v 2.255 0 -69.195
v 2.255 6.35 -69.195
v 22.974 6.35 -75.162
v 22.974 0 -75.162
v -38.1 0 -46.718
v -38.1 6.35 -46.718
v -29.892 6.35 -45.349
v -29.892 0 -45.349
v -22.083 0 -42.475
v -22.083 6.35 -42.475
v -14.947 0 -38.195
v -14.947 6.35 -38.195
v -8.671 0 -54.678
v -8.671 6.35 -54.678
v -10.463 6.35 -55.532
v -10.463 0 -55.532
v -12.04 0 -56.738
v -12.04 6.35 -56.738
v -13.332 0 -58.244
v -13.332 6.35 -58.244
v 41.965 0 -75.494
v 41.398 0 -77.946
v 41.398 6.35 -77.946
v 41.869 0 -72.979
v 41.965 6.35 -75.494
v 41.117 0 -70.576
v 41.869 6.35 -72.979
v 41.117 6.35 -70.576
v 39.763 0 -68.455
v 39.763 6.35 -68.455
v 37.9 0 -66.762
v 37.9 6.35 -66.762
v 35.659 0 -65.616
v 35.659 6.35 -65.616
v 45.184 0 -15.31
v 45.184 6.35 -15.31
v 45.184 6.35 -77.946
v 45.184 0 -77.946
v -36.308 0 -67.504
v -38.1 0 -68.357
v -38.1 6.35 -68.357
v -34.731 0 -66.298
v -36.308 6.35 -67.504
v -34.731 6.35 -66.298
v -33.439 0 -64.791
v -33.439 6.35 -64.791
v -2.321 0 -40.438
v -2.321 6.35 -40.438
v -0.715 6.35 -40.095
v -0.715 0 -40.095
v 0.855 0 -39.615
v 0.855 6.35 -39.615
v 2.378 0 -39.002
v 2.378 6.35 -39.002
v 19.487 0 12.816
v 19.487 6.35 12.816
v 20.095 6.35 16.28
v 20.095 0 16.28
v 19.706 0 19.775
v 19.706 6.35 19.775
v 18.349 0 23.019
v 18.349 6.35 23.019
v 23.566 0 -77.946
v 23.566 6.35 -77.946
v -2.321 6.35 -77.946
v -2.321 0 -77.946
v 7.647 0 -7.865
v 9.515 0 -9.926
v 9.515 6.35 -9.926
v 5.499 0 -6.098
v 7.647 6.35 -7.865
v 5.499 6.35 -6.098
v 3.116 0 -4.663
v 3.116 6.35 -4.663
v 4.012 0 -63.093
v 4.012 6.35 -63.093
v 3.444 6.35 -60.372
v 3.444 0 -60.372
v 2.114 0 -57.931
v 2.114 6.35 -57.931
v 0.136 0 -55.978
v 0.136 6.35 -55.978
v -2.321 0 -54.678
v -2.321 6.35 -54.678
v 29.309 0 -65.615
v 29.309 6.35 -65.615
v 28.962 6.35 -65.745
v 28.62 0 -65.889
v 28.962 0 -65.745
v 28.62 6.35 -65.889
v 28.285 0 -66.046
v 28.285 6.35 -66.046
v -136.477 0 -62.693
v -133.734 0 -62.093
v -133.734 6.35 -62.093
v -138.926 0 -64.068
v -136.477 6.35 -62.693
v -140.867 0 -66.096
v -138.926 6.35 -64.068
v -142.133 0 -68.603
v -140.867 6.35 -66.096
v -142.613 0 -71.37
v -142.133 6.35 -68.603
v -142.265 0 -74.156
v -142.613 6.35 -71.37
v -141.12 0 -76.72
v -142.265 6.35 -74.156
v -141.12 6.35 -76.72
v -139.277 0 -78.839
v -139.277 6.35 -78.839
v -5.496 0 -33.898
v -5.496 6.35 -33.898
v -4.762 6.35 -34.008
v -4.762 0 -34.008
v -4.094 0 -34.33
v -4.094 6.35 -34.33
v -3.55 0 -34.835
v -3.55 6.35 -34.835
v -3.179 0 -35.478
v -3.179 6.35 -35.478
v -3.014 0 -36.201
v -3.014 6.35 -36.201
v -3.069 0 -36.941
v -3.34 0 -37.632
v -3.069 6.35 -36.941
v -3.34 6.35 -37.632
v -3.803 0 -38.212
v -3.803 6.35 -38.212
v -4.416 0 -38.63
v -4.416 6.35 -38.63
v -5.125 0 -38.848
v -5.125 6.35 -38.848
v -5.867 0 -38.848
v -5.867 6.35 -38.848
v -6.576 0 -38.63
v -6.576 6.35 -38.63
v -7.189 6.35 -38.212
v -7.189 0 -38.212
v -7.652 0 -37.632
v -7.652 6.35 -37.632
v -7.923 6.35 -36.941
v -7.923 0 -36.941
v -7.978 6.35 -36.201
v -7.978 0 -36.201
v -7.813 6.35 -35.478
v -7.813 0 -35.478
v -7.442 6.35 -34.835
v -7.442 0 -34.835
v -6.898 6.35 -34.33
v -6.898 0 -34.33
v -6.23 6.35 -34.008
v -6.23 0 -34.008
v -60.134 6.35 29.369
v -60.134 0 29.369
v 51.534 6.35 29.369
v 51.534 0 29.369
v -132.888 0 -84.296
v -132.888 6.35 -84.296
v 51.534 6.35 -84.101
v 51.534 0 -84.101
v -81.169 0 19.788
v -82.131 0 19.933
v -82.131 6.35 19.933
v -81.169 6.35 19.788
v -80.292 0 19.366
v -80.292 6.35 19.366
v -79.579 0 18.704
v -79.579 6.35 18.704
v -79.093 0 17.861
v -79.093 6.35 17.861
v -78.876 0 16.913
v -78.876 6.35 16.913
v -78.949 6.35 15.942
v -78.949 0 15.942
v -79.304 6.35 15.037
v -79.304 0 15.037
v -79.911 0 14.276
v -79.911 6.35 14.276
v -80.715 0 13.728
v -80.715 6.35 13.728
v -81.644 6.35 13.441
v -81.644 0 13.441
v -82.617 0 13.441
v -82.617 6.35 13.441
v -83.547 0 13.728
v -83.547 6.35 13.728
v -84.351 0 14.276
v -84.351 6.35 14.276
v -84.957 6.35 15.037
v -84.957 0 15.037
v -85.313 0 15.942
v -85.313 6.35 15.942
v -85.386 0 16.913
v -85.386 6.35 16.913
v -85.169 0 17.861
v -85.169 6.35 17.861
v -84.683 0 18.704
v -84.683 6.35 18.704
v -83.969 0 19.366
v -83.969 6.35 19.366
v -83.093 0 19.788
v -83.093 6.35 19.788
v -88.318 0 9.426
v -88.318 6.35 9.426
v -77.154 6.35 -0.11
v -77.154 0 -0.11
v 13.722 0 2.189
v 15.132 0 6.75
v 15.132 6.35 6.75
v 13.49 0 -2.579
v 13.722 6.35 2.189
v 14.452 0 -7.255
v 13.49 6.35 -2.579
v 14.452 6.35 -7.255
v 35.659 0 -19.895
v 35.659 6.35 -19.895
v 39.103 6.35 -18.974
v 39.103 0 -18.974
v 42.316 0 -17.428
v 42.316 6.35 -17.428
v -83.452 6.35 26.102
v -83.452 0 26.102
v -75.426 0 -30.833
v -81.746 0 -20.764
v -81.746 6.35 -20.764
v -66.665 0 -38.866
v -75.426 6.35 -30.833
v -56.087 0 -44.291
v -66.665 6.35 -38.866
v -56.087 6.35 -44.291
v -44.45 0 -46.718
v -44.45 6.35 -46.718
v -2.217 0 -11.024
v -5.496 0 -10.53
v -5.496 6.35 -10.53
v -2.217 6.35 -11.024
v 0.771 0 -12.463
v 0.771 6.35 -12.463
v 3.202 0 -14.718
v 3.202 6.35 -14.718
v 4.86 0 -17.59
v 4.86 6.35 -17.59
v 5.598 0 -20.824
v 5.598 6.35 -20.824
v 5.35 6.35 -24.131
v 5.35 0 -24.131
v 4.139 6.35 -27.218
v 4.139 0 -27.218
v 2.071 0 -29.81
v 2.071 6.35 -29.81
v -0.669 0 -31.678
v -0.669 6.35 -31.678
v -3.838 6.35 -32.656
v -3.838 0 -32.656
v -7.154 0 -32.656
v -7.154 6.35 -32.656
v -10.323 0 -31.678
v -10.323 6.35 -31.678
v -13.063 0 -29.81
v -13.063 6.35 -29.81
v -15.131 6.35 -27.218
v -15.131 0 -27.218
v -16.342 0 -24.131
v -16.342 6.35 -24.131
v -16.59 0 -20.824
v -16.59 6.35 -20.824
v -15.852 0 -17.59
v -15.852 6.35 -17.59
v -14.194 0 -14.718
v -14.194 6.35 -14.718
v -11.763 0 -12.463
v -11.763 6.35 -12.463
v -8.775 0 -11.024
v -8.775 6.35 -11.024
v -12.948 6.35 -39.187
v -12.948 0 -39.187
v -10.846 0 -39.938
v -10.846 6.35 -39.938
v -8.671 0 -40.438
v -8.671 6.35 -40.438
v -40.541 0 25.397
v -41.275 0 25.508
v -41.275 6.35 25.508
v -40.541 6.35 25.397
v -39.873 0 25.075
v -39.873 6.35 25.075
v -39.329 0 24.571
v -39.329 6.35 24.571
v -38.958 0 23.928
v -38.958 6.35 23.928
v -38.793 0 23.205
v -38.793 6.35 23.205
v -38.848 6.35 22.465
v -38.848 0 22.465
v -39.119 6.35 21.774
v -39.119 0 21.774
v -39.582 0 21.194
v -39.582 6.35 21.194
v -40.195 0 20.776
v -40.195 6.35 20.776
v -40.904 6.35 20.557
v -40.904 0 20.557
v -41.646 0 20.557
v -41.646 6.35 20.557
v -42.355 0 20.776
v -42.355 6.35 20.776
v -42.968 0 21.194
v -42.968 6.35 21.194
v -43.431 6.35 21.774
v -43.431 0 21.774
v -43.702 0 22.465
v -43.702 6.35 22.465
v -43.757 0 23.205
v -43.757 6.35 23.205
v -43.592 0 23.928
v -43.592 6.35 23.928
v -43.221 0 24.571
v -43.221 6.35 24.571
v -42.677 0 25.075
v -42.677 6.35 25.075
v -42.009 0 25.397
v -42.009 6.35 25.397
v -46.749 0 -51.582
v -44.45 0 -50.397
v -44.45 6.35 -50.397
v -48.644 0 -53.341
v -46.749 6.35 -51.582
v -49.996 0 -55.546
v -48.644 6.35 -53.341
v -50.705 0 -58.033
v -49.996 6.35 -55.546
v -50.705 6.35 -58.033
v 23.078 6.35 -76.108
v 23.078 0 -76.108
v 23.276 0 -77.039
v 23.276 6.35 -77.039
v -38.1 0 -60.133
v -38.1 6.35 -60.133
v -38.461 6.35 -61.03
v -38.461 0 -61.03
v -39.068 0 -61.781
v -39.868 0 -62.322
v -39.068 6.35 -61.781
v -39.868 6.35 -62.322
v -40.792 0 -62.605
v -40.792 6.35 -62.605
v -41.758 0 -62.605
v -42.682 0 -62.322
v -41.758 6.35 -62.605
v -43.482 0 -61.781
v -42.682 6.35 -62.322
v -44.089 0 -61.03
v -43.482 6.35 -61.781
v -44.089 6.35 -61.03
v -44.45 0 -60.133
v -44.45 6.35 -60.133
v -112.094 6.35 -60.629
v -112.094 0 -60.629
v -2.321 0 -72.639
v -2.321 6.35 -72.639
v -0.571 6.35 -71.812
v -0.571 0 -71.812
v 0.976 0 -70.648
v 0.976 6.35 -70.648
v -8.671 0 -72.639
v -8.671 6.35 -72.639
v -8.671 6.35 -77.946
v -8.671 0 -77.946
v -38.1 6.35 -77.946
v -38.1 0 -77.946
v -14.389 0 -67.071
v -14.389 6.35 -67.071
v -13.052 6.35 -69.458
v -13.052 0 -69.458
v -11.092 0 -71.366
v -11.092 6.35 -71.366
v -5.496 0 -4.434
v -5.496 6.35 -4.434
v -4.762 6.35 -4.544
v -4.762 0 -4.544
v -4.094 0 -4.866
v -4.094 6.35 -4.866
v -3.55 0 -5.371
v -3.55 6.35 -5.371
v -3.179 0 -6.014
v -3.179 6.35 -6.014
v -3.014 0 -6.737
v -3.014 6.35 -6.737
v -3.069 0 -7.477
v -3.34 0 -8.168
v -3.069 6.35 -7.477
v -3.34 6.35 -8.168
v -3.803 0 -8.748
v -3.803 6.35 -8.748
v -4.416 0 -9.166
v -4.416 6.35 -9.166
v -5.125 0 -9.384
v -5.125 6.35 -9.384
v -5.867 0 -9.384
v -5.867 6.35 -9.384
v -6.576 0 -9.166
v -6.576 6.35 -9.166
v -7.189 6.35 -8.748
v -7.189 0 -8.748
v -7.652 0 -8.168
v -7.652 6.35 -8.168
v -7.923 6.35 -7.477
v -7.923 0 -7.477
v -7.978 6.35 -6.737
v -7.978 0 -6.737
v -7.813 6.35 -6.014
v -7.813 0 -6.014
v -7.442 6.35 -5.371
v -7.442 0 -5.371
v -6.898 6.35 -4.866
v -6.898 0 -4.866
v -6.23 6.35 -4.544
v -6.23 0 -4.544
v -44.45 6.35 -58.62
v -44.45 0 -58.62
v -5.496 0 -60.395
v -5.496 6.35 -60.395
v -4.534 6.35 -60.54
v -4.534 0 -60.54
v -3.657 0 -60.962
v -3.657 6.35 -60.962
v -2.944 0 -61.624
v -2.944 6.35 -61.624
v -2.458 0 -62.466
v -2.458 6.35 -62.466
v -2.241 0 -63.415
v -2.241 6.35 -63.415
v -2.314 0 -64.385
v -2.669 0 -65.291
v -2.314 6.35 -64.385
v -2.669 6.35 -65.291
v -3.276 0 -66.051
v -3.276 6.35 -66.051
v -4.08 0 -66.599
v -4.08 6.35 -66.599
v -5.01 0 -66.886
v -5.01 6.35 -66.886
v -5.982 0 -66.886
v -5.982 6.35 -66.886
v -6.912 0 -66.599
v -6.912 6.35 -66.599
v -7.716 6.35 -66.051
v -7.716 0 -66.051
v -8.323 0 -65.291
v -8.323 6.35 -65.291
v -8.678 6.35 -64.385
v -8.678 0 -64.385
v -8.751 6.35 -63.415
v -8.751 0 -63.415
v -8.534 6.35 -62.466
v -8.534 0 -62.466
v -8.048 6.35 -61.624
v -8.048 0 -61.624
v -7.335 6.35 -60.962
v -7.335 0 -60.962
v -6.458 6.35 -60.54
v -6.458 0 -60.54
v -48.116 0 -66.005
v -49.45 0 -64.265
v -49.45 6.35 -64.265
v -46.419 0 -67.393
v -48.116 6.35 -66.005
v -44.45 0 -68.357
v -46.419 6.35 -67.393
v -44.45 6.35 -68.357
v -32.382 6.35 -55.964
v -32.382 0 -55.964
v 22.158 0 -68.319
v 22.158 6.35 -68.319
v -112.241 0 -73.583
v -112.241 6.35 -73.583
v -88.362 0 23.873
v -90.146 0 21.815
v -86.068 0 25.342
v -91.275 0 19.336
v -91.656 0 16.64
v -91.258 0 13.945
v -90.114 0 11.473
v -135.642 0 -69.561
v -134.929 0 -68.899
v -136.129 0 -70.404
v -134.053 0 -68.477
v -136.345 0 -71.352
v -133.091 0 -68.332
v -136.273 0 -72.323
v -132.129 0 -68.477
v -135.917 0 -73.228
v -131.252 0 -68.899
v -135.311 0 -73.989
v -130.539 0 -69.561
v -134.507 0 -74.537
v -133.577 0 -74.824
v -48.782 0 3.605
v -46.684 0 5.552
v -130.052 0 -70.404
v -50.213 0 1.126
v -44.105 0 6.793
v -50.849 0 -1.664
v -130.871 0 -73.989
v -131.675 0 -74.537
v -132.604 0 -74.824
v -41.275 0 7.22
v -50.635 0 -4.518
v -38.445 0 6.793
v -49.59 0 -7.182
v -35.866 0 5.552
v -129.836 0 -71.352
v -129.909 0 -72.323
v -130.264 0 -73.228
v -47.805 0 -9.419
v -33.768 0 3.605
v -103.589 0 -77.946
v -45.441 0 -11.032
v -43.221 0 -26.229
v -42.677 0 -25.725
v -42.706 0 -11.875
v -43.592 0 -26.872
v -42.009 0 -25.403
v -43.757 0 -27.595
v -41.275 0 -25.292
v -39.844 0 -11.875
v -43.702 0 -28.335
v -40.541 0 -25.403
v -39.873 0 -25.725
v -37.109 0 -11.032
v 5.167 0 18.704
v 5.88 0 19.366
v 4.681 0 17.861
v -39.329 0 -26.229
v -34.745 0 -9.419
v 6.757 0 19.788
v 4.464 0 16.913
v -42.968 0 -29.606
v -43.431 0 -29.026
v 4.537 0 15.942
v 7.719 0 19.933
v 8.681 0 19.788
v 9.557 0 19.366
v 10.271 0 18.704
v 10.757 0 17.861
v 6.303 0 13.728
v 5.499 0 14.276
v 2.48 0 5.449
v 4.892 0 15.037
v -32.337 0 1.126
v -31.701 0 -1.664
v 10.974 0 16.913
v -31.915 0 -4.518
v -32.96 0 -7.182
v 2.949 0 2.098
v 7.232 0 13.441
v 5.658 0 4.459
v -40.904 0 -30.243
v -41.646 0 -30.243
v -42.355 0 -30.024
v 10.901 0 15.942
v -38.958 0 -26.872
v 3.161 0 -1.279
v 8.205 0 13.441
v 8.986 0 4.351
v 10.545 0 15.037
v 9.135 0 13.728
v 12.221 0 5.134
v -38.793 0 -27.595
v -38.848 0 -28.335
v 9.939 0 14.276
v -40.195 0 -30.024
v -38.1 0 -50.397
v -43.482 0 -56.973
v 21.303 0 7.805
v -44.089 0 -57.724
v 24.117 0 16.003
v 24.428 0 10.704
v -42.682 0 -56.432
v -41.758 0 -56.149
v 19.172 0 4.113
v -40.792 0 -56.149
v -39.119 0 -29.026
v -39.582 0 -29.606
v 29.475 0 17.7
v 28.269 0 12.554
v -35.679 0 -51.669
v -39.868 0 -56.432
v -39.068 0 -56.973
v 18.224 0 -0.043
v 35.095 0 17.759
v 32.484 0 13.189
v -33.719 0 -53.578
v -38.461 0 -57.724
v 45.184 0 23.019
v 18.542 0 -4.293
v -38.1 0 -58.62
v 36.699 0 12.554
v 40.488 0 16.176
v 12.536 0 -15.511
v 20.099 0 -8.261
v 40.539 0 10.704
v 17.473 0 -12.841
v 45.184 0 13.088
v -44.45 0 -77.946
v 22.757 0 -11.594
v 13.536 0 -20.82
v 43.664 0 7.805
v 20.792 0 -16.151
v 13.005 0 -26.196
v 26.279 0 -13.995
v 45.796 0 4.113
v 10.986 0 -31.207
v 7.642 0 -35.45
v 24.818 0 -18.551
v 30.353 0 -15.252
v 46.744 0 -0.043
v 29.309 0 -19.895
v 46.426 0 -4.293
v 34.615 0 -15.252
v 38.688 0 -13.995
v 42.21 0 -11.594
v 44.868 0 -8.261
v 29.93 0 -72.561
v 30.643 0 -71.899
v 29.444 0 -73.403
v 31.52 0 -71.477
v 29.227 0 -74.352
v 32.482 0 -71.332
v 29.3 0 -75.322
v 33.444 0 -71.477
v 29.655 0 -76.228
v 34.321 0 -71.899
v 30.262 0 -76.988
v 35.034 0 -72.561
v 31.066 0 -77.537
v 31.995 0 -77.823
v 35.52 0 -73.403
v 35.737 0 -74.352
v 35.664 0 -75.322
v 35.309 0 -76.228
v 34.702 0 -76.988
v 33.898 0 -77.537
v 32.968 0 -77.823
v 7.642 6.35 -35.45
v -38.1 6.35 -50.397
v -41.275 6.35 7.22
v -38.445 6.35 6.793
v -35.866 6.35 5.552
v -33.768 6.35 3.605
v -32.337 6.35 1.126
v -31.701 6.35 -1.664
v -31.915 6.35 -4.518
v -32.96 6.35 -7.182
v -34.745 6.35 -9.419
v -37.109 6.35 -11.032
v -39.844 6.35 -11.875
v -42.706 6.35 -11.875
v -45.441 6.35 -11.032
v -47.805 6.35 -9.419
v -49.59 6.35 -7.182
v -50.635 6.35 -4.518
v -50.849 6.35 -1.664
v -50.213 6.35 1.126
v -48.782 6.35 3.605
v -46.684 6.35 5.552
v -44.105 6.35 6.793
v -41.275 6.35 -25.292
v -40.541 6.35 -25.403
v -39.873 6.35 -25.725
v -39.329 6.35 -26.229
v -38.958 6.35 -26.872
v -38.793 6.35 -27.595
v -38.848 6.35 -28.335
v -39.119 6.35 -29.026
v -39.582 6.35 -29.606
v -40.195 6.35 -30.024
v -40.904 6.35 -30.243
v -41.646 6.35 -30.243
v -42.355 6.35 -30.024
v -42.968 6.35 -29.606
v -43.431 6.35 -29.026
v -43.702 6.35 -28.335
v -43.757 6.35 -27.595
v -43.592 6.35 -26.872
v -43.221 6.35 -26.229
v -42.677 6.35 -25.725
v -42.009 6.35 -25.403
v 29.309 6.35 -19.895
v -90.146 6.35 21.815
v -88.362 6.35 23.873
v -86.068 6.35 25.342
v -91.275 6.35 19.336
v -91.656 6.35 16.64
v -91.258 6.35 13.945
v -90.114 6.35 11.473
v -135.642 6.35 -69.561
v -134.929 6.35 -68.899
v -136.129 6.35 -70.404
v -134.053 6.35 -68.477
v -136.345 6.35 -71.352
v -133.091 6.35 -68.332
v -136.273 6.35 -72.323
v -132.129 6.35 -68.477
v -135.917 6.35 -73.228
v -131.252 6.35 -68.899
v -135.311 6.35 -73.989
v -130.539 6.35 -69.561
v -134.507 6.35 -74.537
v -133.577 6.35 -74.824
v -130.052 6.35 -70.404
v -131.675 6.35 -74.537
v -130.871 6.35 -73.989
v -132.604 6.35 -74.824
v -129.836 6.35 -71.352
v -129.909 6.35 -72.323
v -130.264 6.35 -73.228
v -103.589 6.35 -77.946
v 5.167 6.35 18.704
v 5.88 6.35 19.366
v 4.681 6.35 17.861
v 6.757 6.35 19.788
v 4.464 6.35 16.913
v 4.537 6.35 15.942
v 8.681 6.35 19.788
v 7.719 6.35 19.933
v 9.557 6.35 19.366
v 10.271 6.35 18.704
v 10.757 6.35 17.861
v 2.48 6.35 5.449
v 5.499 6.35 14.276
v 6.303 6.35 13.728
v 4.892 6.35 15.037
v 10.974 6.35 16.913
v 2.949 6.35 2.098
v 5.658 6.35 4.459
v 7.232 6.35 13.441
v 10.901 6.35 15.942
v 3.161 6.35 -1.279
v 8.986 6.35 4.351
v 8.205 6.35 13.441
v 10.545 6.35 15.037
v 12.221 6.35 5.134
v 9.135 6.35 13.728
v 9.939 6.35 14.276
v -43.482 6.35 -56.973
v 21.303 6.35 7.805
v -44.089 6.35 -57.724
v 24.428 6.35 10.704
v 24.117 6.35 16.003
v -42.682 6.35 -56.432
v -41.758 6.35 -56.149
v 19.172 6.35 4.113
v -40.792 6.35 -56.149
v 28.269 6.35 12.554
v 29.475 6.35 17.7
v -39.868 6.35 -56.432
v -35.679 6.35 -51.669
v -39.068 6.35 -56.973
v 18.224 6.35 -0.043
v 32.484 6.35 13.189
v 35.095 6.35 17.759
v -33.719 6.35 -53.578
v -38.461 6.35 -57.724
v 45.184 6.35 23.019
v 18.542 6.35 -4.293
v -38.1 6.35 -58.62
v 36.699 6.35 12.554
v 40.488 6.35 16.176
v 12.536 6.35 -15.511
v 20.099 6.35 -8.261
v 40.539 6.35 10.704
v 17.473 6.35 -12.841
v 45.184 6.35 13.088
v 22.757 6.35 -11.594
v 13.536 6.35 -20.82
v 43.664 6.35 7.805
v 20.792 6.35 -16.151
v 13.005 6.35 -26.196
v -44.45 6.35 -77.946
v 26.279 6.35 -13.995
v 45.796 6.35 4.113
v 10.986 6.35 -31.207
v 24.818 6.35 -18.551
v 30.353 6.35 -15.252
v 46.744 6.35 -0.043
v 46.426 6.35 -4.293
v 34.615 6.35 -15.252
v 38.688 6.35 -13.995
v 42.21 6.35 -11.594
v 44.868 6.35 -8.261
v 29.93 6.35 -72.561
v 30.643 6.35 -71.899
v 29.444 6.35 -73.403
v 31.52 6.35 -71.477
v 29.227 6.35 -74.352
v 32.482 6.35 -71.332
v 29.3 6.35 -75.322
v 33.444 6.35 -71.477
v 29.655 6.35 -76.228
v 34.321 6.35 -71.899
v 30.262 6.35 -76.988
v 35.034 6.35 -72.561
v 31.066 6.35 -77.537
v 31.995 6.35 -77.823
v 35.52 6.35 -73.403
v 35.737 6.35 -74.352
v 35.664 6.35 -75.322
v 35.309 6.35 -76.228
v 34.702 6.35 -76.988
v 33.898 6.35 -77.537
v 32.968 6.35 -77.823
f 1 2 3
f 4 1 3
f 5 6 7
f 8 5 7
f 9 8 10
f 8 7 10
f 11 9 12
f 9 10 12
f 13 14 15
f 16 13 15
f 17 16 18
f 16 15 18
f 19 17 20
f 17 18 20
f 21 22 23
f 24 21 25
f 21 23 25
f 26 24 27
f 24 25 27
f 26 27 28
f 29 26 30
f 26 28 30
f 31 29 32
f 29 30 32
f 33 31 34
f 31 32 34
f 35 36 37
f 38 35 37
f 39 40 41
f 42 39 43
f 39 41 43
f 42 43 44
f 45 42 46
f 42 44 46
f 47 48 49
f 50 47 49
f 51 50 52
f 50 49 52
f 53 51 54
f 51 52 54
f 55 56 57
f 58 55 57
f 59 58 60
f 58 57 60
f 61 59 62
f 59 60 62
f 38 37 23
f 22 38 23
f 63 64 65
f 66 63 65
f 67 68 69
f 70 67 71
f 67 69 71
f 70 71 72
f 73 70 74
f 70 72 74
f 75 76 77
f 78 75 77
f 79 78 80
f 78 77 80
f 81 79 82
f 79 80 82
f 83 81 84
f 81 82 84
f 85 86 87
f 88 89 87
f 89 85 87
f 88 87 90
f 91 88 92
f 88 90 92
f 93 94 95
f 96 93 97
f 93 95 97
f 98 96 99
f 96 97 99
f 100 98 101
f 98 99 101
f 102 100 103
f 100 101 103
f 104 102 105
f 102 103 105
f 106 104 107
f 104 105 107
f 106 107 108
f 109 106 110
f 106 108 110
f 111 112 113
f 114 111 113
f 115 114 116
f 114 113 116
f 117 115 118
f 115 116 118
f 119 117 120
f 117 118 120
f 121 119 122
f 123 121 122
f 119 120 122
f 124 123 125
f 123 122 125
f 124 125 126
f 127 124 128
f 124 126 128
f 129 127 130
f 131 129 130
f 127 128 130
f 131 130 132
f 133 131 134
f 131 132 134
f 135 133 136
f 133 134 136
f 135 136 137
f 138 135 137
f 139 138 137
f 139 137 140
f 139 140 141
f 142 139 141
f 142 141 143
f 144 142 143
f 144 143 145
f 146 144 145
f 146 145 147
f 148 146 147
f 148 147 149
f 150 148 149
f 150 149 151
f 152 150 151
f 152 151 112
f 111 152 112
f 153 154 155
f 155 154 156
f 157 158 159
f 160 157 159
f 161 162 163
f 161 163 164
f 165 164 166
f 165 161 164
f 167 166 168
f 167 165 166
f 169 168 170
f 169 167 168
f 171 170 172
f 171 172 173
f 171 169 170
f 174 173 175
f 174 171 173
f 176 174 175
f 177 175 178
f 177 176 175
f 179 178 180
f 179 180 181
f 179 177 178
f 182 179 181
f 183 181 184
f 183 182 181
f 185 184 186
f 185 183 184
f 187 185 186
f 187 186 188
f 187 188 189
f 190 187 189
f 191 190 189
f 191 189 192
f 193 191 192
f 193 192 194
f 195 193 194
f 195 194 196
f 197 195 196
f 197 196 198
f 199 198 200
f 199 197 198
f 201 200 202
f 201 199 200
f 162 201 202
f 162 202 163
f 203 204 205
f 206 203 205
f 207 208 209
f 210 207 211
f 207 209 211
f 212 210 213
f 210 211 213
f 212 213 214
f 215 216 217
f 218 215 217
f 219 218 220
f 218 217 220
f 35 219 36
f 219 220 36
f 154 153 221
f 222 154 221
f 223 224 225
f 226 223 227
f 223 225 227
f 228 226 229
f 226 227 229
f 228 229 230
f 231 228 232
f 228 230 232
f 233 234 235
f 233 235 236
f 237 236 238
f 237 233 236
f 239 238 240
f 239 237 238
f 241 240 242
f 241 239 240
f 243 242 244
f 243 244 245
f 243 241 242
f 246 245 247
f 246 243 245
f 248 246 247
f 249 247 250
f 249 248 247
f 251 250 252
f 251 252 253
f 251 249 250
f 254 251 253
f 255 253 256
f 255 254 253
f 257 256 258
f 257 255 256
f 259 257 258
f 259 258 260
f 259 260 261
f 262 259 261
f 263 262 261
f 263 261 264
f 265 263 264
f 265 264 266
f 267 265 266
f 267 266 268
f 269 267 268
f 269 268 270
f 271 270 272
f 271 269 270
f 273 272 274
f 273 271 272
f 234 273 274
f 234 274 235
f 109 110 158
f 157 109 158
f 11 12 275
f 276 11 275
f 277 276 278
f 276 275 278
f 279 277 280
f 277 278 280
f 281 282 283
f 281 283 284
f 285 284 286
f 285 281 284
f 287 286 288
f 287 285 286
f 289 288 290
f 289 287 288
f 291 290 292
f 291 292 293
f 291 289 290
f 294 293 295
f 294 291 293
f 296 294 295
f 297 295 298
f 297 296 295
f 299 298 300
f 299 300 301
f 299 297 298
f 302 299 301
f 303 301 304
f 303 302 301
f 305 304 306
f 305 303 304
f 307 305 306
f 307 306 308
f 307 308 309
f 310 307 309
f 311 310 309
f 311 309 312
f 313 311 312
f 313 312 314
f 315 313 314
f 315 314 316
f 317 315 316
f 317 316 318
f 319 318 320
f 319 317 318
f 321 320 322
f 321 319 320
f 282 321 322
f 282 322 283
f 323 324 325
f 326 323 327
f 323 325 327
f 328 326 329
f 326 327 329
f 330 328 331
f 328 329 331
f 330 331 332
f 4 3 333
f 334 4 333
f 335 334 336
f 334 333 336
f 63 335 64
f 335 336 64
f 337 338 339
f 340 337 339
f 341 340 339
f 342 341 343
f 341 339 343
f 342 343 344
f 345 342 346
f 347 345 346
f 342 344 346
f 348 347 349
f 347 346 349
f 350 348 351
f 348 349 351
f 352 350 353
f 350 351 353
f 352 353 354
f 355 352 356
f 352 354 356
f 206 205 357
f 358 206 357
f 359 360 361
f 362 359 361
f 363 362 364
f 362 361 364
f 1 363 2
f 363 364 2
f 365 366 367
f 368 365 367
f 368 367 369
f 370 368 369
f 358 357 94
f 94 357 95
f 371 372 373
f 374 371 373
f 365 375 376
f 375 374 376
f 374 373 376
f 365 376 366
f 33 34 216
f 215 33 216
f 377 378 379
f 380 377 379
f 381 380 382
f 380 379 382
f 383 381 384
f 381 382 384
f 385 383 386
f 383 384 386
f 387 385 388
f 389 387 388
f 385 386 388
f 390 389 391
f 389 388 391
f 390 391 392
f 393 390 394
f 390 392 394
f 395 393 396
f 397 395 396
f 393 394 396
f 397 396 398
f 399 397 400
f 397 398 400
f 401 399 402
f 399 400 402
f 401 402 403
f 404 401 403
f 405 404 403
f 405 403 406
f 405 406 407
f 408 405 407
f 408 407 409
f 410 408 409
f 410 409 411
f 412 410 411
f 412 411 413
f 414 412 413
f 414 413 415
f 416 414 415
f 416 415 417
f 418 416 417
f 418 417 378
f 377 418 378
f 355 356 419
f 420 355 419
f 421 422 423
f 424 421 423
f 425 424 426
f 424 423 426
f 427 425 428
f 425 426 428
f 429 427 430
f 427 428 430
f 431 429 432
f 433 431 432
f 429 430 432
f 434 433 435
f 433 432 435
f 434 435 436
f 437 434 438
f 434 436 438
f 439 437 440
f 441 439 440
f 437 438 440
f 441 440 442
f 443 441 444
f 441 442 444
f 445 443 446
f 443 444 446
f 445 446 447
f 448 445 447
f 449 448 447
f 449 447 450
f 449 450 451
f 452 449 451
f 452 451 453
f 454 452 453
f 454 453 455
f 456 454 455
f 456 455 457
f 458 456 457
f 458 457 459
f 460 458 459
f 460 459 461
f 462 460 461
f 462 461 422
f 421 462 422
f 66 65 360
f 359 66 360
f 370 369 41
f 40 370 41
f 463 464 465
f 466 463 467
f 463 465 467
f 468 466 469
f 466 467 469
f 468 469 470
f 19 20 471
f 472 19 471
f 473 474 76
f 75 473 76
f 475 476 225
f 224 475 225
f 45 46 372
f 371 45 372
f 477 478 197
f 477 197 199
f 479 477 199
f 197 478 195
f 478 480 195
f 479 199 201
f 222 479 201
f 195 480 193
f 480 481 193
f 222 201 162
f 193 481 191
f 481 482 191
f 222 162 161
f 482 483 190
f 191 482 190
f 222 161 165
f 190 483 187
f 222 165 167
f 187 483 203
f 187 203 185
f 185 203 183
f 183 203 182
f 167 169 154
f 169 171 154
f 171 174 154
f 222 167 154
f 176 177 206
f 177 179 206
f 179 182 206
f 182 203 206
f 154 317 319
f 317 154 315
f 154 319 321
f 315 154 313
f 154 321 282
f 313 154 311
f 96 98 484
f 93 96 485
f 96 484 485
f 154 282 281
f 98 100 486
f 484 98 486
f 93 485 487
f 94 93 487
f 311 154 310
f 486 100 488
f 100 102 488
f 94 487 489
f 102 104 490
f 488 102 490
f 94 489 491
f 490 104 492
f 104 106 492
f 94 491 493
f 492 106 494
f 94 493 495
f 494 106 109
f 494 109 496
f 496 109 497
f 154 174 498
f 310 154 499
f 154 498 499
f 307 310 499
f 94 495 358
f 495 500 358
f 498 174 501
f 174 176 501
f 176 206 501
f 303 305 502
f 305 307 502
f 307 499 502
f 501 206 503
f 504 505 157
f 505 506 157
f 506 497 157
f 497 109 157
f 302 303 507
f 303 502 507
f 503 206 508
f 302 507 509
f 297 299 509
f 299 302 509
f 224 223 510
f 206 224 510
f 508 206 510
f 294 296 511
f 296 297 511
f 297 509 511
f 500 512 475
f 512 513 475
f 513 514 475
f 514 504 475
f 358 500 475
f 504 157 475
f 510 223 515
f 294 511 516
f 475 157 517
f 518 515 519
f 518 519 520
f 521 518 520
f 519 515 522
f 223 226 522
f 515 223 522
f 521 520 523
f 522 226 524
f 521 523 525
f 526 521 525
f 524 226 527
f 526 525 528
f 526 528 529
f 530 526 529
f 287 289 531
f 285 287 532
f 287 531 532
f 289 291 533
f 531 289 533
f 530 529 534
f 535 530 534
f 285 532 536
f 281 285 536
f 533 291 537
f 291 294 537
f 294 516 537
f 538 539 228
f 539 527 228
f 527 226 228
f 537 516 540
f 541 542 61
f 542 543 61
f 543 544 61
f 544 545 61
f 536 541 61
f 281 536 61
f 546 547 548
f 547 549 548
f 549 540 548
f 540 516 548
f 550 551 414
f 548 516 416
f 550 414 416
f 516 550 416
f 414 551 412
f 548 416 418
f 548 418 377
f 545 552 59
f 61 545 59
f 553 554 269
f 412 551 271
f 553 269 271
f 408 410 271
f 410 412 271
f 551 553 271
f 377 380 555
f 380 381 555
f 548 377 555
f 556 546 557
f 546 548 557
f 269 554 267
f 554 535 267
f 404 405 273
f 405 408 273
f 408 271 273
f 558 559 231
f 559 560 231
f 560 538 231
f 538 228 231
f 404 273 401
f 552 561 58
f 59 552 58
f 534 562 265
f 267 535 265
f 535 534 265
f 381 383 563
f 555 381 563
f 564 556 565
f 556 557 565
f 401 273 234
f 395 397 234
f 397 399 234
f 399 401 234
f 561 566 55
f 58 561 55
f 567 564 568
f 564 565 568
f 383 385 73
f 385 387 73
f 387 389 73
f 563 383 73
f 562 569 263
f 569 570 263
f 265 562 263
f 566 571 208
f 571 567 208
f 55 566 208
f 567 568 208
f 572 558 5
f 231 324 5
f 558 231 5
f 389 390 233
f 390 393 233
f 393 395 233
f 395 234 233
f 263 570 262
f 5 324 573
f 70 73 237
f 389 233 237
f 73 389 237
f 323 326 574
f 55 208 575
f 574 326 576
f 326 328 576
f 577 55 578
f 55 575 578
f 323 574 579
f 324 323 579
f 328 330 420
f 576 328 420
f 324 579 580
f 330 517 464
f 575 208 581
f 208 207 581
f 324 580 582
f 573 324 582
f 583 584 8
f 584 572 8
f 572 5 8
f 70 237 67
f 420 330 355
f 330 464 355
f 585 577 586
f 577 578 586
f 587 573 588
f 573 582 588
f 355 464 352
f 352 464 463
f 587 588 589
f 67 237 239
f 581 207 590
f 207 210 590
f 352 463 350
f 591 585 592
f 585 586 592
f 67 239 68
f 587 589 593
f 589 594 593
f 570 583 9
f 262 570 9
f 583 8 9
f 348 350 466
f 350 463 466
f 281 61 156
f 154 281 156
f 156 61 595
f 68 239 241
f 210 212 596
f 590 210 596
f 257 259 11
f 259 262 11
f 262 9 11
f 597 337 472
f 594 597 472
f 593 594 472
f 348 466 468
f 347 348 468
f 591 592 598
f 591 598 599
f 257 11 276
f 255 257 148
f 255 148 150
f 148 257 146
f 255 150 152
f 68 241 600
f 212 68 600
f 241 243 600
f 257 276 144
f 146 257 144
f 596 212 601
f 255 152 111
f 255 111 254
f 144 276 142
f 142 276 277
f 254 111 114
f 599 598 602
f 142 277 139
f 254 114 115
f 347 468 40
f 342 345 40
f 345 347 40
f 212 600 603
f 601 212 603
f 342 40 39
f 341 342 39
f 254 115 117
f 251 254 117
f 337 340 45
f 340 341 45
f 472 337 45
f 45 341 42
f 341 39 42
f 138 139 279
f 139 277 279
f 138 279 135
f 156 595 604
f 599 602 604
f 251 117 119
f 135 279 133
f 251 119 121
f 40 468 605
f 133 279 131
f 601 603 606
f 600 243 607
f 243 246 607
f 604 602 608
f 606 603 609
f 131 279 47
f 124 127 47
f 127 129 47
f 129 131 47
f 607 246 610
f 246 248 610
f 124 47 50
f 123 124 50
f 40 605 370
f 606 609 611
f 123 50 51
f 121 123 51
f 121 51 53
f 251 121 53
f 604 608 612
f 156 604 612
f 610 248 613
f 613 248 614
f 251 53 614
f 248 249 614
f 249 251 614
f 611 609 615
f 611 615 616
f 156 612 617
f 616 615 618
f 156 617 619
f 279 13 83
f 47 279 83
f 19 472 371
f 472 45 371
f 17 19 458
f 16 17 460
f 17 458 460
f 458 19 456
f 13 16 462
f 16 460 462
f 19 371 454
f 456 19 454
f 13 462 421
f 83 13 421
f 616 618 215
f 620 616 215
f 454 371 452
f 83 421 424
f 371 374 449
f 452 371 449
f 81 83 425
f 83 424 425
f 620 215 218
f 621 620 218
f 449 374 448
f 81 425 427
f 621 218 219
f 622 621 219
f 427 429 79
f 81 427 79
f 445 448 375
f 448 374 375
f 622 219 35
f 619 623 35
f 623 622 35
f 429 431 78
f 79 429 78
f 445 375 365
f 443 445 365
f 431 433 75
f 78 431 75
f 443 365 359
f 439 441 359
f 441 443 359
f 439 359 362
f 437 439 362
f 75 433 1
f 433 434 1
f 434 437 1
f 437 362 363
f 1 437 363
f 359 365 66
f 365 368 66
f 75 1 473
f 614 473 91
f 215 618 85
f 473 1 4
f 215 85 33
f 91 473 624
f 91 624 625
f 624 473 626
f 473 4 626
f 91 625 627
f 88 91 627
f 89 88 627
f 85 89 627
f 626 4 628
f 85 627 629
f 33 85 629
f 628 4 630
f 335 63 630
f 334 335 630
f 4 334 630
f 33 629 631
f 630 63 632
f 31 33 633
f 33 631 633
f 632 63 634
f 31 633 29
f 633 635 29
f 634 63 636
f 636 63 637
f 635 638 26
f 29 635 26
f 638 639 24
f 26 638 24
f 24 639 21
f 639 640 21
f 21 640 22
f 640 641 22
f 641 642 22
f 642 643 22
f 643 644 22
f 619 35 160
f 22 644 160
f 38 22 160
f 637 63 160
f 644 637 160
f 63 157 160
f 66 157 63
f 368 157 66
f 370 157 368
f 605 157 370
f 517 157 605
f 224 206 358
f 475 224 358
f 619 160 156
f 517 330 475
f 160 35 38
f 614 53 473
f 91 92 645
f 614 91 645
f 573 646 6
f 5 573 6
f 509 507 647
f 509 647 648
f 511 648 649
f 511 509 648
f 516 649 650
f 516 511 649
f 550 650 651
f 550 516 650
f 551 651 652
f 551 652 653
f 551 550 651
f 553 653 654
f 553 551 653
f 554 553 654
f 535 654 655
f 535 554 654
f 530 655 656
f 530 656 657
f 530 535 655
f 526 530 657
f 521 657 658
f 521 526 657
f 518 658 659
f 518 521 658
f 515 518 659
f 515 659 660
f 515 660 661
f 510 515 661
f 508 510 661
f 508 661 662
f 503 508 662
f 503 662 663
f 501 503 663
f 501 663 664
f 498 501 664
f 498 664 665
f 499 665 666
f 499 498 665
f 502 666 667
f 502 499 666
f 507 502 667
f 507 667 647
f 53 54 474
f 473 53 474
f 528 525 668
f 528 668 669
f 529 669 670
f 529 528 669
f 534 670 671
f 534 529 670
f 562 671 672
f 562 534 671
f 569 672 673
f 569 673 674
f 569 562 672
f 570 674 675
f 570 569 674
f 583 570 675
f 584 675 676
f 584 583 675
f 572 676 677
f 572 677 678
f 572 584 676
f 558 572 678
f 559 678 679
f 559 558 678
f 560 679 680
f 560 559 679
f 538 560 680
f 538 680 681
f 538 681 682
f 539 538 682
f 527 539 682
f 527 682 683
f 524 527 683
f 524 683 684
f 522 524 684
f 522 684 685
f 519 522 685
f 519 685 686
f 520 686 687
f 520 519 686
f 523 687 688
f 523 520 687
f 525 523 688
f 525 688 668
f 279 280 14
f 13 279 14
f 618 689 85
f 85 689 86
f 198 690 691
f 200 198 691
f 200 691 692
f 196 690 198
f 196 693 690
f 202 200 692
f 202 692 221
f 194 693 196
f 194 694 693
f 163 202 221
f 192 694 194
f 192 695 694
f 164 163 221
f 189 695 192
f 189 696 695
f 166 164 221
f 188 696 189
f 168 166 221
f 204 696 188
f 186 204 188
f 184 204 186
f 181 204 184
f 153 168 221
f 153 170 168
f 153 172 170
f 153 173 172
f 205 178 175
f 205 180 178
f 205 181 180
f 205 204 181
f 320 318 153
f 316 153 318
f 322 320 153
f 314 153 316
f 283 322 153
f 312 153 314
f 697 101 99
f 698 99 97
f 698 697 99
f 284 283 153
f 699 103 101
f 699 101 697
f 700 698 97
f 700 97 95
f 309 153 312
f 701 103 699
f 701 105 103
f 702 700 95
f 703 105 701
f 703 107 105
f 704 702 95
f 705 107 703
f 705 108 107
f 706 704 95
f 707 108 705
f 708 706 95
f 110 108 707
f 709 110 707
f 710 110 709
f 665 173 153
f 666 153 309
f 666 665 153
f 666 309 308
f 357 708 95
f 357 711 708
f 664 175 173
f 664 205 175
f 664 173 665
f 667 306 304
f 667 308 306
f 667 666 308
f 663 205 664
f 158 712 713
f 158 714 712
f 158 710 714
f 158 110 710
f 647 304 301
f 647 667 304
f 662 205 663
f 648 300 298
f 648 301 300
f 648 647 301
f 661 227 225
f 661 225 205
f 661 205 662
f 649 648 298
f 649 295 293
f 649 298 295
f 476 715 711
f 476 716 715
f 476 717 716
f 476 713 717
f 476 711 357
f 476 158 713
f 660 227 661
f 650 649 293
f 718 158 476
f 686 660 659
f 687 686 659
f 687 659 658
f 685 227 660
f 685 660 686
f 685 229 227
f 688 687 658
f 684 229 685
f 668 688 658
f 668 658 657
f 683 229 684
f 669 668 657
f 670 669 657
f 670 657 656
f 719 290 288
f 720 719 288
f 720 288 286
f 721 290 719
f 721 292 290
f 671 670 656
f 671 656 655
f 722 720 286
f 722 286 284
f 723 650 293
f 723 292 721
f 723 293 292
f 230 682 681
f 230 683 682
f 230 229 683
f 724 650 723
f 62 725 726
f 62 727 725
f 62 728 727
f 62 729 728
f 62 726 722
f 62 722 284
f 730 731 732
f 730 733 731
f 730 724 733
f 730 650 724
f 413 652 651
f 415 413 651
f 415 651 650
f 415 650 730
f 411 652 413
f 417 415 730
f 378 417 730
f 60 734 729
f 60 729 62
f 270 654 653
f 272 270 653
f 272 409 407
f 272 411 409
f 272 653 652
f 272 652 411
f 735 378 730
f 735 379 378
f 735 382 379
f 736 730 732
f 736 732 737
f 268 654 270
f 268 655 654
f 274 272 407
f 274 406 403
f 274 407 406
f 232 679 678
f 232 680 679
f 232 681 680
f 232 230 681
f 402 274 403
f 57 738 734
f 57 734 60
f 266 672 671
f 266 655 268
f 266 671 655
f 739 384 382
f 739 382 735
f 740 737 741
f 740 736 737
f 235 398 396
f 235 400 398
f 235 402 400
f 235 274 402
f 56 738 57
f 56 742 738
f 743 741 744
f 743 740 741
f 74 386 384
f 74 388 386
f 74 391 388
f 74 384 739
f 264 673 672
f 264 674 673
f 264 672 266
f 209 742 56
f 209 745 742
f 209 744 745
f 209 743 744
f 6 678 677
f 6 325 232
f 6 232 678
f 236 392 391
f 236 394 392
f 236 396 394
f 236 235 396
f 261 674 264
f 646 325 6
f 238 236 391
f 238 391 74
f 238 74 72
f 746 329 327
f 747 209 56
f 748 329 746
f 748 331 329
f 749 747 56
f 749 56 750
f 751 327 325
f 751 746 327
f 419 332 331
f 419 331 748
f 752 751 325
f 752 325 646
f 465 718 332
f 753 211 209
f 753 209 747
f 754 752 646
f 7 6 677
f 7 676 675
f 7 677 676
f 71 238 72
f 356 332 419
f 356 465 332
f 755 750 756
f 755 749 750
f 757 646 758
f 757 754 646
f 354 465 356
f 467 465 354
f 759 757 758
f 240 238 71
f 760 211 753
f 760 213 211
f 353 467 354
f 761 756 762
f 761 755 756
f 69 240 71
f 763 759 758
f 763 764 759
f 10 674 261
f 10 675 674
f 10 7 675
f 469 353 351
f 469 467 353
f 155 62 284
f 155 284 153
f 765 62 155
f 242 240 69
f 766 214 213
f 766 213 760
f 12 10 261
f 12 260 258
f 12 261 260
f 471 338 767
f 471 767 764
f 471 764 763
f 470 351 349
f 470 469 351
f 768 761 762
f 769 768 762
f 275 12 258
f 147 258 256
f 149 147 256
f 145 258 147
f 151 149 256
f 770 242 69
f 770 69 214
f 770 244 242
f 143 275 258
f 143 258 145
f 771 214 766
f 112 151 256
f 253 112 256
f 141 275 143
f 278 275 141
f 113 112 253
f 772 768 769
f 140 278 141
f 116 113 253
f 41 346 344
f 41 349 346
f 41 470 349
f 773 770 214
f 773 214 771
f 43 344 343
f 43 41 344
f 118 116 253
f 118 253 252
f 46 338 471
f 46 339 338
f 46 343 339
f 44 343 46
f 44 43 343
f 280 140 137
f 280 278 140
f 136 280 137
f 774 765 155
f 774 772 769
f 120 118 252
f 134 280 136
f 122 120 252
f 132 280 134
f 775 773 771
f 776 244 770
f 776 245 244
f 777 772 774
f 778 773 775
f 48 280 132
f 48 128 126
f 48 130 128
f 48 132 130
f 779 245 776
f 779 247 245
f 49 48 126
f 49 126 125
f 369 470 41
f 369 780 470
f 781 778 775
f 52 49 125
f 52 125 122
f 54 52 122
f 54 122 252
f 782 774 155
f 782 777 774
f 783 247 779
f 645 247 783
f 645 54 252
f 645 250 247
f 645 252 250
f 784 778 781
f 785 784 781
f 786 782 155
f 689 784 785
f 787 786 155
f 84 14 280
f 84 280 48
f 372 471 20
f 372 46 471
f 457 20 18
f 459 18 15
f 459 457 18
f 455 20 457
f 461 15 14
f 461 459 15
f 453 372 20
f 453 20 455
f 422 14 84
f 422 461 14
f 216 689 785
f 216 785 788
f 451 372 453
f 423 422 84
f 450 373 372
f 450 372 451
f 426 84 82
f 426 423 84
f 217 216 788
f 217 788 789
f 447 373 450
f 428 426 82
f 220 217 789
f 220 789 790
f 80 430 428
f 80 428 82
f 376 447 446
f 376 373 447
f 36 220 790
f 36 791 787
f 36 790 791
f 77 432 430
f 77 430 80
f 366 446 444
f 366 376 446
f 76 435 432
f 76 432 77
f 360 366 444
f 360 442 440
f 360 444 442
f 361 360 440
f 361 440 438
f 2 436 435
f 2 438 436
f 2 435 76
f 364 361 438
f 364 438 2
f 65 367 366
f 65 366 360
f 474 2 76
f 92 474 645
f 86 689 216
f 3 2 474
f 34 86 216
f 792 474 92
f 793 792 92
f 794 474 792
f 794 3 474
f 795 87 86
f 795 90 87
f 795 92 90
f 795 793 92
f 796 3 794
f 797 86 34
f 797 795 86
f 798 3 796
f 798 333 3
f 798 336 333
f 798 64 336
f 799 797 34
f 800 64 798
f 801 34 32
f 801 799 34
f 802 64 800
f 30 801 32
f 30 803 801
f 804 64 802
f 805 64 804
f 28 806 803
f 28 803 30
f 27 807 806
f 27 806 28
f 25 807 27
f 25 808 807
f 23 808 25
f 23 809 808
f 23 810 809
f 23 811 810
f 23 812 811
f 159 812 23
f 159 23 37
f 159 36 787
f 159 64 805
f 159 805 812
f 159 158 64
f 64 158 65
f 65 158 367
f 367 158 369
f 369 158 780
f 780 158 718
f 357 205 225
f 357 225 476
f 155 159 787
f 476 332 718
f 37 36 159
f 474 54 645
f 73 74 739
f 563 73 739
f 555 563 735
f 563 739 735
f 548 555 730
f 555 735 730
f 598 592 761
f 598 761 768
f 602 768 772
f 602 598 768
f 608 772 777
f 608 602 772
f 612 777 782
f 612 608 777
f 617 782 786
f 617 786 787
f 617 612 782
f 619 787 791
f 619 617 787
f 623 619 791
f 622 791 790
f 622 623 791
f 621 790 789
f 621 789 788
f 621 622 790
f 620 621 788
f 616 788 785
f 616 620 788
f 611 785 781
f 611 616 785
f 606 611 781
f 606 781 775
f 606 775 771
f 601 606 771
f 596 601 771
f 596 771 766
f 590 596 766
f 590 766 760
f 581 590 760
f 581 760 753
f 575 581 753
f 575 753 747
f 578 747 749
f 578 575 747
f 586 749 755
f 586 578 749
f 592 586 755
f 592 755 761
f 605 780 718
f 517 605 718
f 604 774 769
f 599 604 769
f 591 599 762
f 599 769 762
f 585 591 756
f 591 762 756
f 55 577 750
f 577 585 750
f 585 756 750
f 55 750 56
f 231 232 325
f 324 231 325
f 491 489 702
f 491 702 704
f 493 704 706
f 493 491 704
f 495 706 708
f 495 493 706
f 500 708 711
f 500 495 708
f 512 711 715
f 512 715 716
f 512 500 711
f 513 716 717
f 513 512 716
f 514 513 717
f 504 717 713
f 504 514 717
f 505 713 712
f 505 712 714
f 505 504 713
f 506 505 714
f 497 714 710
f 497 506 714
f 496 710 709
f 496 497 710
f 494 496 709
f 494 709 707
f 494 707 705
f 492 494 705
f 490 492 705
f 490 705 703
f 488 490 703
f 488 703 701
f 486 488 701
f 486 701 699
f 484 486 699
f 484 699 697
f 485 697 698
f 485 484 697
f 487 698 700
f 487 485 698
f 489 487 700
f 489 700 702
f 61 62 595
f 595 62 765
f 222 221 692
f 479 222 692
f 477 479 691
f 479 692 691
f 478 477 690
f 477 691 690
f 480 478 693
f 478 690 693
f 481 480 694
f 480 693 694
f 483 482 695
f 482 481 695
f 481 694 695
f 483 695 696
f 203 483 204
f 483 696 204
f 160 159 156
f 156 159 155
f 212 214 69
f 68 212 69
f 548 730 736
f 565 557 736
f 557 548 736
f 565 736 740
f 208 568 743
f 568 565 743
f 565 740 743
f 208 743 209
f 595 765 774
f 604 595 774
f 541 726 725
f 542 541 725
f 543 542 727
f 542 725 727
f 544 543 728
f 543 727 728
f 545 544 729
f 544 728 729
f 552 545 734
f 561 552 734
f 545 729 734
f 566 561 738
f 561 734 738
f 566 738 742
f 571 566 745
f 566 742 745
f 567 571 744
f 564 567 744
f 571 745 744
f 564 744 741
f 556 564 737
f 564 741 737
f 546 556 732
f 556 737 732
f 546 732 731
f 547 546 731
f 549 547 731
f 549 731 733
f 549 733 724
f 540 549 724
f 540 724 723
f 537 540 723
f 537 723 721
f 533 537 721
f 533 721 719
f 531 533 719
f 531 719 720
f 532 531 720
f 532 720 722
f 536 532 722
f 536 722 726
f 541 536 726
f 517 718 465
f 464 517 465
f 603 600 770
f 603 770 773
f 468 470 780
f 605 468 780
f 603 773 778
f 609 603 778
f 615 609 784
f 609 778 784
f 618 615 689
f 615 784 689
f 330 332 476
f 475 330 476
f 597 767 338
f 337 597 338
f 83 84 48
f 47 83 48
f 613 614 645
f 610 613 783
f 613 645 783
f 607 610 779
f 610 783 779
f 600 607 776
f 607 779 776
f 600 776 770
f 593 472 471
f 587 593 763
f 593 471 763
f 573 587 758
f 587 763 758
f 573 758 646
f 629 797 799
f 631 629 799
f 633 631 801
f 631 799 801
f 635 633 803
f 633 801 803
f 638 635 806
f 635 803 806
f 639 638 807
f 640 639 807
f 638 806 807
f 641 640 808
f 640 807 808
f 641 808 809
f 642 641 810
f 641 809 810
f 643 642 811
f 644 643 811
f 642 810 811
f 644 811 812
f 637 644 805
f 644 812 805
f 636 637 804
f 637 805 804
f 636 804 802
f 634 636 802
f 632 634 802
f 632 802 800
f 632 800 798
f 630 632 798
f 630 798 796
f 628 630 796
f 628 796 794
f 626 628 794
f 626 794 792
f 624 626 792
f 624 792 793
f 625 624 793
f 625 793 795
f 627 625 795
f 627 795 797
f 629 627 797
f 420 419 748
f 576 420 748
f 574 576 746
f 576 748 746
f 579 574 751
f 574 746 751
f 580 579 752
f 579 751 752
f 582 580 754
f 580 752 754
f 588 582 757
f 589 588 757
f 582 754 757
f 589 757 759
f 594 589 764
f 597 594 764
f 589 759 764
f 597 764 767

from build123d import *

# Parameters (mm, degrees)
SKETCH2_R           = 9.6012
SKETCH2_R_2         = 2.4892
SKETCH2_R_3         = 3.2639
SKETCH2_R_4         = 11.1252
SKETCH2_R_5         = 14.3002
SKETCH2_R_6         = 2.413
BOSS_EXTRUDE1_DEPTH = 6.35
SKETCH3_R           = 3.2639
SKETCH3_R_2         = 2.413
SKETCH3_R_3         = 2.4892
CUT_EXTRUDE1_DEPTH  = 177.630627937


with BuildPart() as part:
    # Sketch2 → Boss-Extrude1 (new body)
    with BuildSketch(Plane(origin=(0, 0, 0), x_dir=(1, 0, 0), z_dir=(0, 1, 0))):
        Polygon((-155.087712155, 84.29625), (-89.463193808, -29.36875), (82.46904885, -29.36875), (82.46904885, 84.29625), align=None)
        with Locations(Location((-41.275, 2.38125, 0), (0, 0, 270))):
            Circle(SKETCH2_R, mode=Mode.SUBTRACT)
        with Locations(Location((-41.275, 27.78125, 0), (0, 0, 270))):
            Circle(SKETCH2_R_2, mode=Mode.SUBTRACT)
        with Locations(Location((-41.275, -23.01875, 0), (0, 0, 270))):
            Circle(SKETCH2_R_2, mode=Mode.SUBTRACT)
        with Locations(Location((-82.130845389, -16.66875, 0), (0, 0, 270))):
            Circle(SKETCH2_R_3, mode=Mode.SUBTRACT)
        with Locations(Location((-133.090666899, 71.59625, 0), (0, 0, 270))):
            Circle(SKETCH2_R_3, mode=Mode.SUBTRACT)
        with Locations(Location((-5.496024757, 21.654924548, 0), (0, 0, 270))):
            Circle(SKETCH2_R_4, mode=Mode.SUBTRACT)
        with Locations(Location((32.48383617, 1.11125, 0), (0, 0, 270))):
            Circle(SKETCH2_R_5, mode=Mode.SUBTRACT)
        with Locations(Location((61.774869917, 67.406835627, 0), (0, 0, 270))):
            Circle(SKETCH2_R_6, mode=Mode.SUBTRACT)
        with Locations(Location((76.11904885, -23.01875, 0), (0, 0, 270))):
            Circle(SKETCH2_R_3, mode=Mode.SUBTRACT)
    extrude(amount=BOSS_EXTRUDE1_DEPTH)

    # Sketch3 → Cut-Extrude1 (cut, through all)
    # profile 1 of 18: a face of its own
    with BuildSketch(Plane(origin=(0, 6.35, 0), x_dir=(1, 0, 0), z_dir=(0, 1, 0))):
        with BuildLine():
            Line((-50.704696238, 58.032833483), (-112.240521983, 73.58273966))
            Line((-112.240521983, 73.58273966), (-81.745655831, 20.764082115))
            ThreePointArc((-81.745655831, 20.764082115), (-66.664634619, 38.866438144), (-44.45, 46.717712139))
            Line((-44.45, 46.717712139), (-44.45, 50.396621207))
            ThreePointArc((-44.45, 50.396621207), (-48.64368552, 53.341307868), (-50.704696238, 58.032833483))
        make_face()
    # profile 2 of 18: a face of its own
    with BuildSketch(Plane(origin=(0, 6.35, 0), x_dir=(1, 0, 0), z_dir=(0, 1, 0))):
        with BuildLine():
            Line((-38.1, 50.396621207), (-38.1, 46.717712139))
            ThreePointArc((-38.1, 46.717712139), (-25.920369141, 44.095010454), (-14.947020834, 38.195213939))
            ThreePointArc((-14.947020834, 38.195213939), (-11.907888955, 39.593444485), (-8.671024757, 40.438477859))
            Line((-8.671024757, 40.438477859), (-8.671024757, 54.678493879))
            ThreePointArc((-8.671024757, 54.678493879), (-11.283169826, 56.093396277), (-13.332375749, 58.244211411))
            Line((-13.332375749, 58.244211411), (-32.382270315, 55.964402602))
            ThreePointArc((-32.382270315, 55.964402602), (-34.629883571, 52.552798441), (-38.1, 50.396621207))
        make_face()
    # profile 3 of 18: a face of its own
    with BuildSketch(Plane(origin=(0, 6.35, 0), x_dir=(1, 0, 0), z_dir=(0, 1, 0))):
        with BuildLine():
            ThreePointArc((-133.733764479, 62.092984745), (-142.13305739, 68.602790594), (-139.277335877, 78.838539138))
            Line((-139.277335877, 78.838539138), (-132.888385663, 84.29625))
            Line((-132.888385663, 84.29625), (-155.087712155, 84.29625))
            Line((-155.087712155, 84.29625), (-89.463193808, -29.36875))
            Line((-89.463193808, -29.36875), (-60.133800133, -29.36875))
            Line((-60.133800133, -29.36875), (-83.452466562, -26.101615019))
            ThreePointArc((-83.452466562, -26.101615019), (-91.274629988, -19.336488408), (-88.317514367, -9.426460862))
            Line((-88.317514367, -9.426460862), (-77.153529536, 0.110286058))
            Line((-77.153529536, 0.110286058), (-112.093783272, 60.628580757))
            Line((-112.093783272, 60.628580757), (-133.733764479, 62.092984745))
        make_face()
    # profile 4 of 18: a face of its own
    with BuildSketch(Plane(origin=(0, 6.35, 0), x_dir=(1, 0, 0), z_dir=(0, 1, 0))):
        Polygon((82.46904885, 84.29625), (-132.888385663, 84.29625), (51.53383617, 84.100664467), (51.53383617, -29.36875), (82.46904885, -29.36875), align=None)
        with Locations((76.11904885, -23.01875)):
            Circle(SKETCH3_R, mode=Mode.SUBTRACT)
        with Locations((61.774869917, 67.406835627)):
            Circle(SKETCH3_R_2, mode=Mode.SUBTRACT)
    # profile 5 of 18: a face of its own
    with BuildSketch(Plane(origin=(0, 6.35, 0), x_dir=(1, 0, 0), z_dir=(0, 1, 0))):
        with BuildLine():
            Line((45.18383617, 15.310281657), (45.18383617, 77.94625))
            Line((45.18383617, 77.94625), (41.398231111, 77.94625))
            ThreePointArc((41.398231111, 77.94625), (41.117229303, 70.57627228), (35.65883617, 65.616284578))
            Line((35.65883617, 65.616284578), (35.65883617, 19.894803311))
            ThreePointArc((35.65883617, 19.894803311), (40.745698306, 18.276451253), (45.18383617, 15.310281657))
        make_face()
    # profile 6 of 18: a face of its own
    with BuildSketch(Plane(origin=(0, 6.35, 0), x_dir=(1, 0, 0), z_dir=(0, 1, 0))):
        with BuildLine():
            Line((-44.45, 77.94625), (-103.5894656, 77.94625))
            Line((-103.5894656, 77.94625), (-49.449869194, 64.2653473))
            ThreePointArc((-49.449869194, 64.2653473), (-47.307458964, 66.748109508), (-44.45, 68.357133449))
            Line((-44.45, 68.357133449), (-44.45, 77.94625))
        make_face()
    # profile 7 of 18: a face of its own
    with BuildSketch(Plane(origin=(0, 6.35, 0), x_dir=(1, 0, 0), z_dir=(0, 1, 0))):
        with BuildLine():
            Line((-8.671024757, 77.94625), (-38.1, 77.94625))
            Line((-38.1, 77.94625), (-38.1, 68.357133449))
            ThreePointArc((-38.1, 68.357133449), (-35.487854931, 66.942231051), (-33.438649008, 64.791415916))
            Line((-33.438649008, 64.791415916), (-14.388754442, 67.071224726))
            ThreePointArc((-14.388754442, 67.071224726), (-12.141141186, 70.482828886), (-8.671024757, 72.639006121))
            Line((-8.671024757, 72.639006121), (-8.671024757, 77.94625))
        make_face()
    # profile 8 of 18: a face of its own
    with BuildSketch(Plane(origin=(0, 6.35, 0), x_dir=(1, 0, 0), z_dir=(0, 1, 0))):
        with BuildLine():
            Line((-2.321024757, 54.678493879), (-2.321024757, 40.438477859))
            ThreePointArc((-2.321024757, 40.438477859), (0.074866406, 39.872160113), (2.377715421, 39.001587501))
            Line((2.377715421, 39.001587501), (22.15801549, 68.318685604))
            Line((22.15801549, 68.318685604), (4.01215469, 63.092933247))
            ThreePointArc((4.01215469, 63.092933247), (2.114261551, 57.93082129), (-2.321024757, 54.678493879))
        make_face()
    # profile 9 of 18: a face of its own
    with BuildSketch(Plane(origin=(0, 6.35, 0), x_dir=(1, 0, 0), z_dir=(0, 1, 0))):
        with BuildLine():
            ThreePointArc((7.641632189, 35.450013166), (13.004757083, 26.196242782), (12.536001856, 15.510942435))
            Line((12.536001856, 15.510942435), (17.472938166, 12.840505779))
            ThreePointArc((17.472938166, 12.840505779), (22.730759734, 17.475234846), (29.30883617, 19.894803311))
            Line((29.30883617, 19.894803311), (29.30883617, 65.614932157))
            ThreePointArc((29.30883617, 65.614932157), (28.790391012, 65.815305481), (28.284516096, 66.045577972))
            Line((28.284516096, 66.045577972), (7.641632189, 35.450013166))
        make_face()
    # profile 10 of 18: a face of its own
    with BuildSketch(Plane(origin=(0, 6.35, 0), x_dir=(1, 0, 0), z_dir=(0, 1, 0))):
        with BuildLine():
            Line((14.451809556, 7.255232113), (9.514873246, 9.925668769))
            ThreePointArc((9.514873246, 9.925668769), (6.605195221, 6.942243792), (3.116401587, 4.662908409))
            ThreePointArc((3.116401587, 4.662908409), (3.08719182, -0.411318161), (2.479854635, -5.449152025))
            ThreePointArc((2.479854635, -5.449152025), (8.985543719, -4.351211356), (15.13161349, -6.750230017))
            ThreePointArc((15.13161349, -6.750230017), (13.456237349, 0.187679153), (14.451809556, 7.255232113))
        make_face()
    # profile 11 of 18: a face of its own
    with BuildSketch(Plane(origin=(0, 6.35, 0), x_dir=(1, 0, 0), z_dir=(0, 1, 0))):
        with BuildLine():
            ThreePointArc((-38.1, 60.133460575), (-41.275, 62.640777328), (-44.45, 60.133460575))
            Line((-44.45, 60.133460575), (-44.45, 58.62029408))
            ThreePointArc((-44.45, 58.62029408), (-41.275, 56.112977328), (-38.1, 58.62029408))
            Line((-38.1, 58.62029408), (-38.1, 60.133460575))
        make_face()
    # profile 12 of 18: a face of its own
    with BuildSketch(Plane(origin=(0, 6.35, 0), x_dir=(1, 0, 0), z_dir=(0, 1, 0))):
        with BuildLine():
            ThreePointArc((-2.321024757, 72.639006121), (0.231903953, 71.269036308), (2.254864024, 69.194935338))
            Line((2.254864024, 69.194935338), (22.97374411, 75.161681012))
            ThreePointArc((22.97374411, 75.161681012), (23.165063227, 76.576202255), (23.565616004, 77.94625))
            Line((23.565616004, 77.94625), (-2.321024757, 77.94625))
            Line((-2.321024757, 77.94625), (-2.321024757, 72.639006121))
        make_face()
    # profile 13 of 18: a face of its own
    with BuildSketch(Plane(origin=(0, 6.35, 0), x_dir=(1, 0, 0), z_dir=(0, 1, 0))):
        with BuildLine():
            Line((18.349161012, -23.01875), (45.18383617, -23.01875))
            Line((45.18383617, -23.01875), (45.18383617, -13.087781657))
            ThreePointArc((45.18383617, -13.087781657), (32.282698959, -17.937688128), (19.486846811, -12.816447857))
            ThreePointArc((19.486846811, -12.816447857), (20.025058188, -18.04104949), (18.349161012, -23.01875))
        make_face()
    # profile 14 of 18: a face of its own
    with BuildSketch(Plane(origin=(0, 6.35, 0), x_dir=(1, 0, 0), z_dir=(0, 1, 0))):
        with Locations(Location((32.481923558, 74.59586426, 0), (0, 0, 270))):
            Circle(SKETCH3_R)
    # profile 15 of 18: a face of its own
    with BuildSketch(Plane(origin=(0, 6.35, 0), x_dir=(1, 0, 0), z_dir=(0, 1, 0))):
        with Locations(Location((-5.496024757, 63.65875, 0), (0, 0, 270))):
            Circle(SKETCH3_R)
    # profile 16 of 18: a face of its own
    with BuildSketch(Plane(origin=(0, 6.35, 0), x_dir=(1, 0, 0), z_dir=(0, 1, 0))):
        with Locations(Location((7.71883617, -16.66875, 0), (0, 0, 270))):
            Circle(SKETCH3_R)
    # profile 17 of 18: a face of its own
    with BuildSketch(Plane(origin=(0, 6.35, 0), x_dir=(1, 0, 0), z_dir=(0, 1, 0))):
        with Locations(Location((-5.496024757, 36.386924548, 0), (0, 0, 270))):
            Circle(SKETCH3_R_3)
    # profile 18 of 18: a face of its own
    with BuildSketch(Plane(origin=(0, 6.35, 0), x_dir=(1, 0, 0), z_dir=(0, 1, 0))):
        with Locations(Location((-5.496024757, 6.922924548, 0), (0, 0, 270))):
            Circle(SKETCH3_R_3)
    extrude(amount=-CUT_EXTRUDE1_DEPTH, mode=Mode.SUBTRACT)


solid = part.part
